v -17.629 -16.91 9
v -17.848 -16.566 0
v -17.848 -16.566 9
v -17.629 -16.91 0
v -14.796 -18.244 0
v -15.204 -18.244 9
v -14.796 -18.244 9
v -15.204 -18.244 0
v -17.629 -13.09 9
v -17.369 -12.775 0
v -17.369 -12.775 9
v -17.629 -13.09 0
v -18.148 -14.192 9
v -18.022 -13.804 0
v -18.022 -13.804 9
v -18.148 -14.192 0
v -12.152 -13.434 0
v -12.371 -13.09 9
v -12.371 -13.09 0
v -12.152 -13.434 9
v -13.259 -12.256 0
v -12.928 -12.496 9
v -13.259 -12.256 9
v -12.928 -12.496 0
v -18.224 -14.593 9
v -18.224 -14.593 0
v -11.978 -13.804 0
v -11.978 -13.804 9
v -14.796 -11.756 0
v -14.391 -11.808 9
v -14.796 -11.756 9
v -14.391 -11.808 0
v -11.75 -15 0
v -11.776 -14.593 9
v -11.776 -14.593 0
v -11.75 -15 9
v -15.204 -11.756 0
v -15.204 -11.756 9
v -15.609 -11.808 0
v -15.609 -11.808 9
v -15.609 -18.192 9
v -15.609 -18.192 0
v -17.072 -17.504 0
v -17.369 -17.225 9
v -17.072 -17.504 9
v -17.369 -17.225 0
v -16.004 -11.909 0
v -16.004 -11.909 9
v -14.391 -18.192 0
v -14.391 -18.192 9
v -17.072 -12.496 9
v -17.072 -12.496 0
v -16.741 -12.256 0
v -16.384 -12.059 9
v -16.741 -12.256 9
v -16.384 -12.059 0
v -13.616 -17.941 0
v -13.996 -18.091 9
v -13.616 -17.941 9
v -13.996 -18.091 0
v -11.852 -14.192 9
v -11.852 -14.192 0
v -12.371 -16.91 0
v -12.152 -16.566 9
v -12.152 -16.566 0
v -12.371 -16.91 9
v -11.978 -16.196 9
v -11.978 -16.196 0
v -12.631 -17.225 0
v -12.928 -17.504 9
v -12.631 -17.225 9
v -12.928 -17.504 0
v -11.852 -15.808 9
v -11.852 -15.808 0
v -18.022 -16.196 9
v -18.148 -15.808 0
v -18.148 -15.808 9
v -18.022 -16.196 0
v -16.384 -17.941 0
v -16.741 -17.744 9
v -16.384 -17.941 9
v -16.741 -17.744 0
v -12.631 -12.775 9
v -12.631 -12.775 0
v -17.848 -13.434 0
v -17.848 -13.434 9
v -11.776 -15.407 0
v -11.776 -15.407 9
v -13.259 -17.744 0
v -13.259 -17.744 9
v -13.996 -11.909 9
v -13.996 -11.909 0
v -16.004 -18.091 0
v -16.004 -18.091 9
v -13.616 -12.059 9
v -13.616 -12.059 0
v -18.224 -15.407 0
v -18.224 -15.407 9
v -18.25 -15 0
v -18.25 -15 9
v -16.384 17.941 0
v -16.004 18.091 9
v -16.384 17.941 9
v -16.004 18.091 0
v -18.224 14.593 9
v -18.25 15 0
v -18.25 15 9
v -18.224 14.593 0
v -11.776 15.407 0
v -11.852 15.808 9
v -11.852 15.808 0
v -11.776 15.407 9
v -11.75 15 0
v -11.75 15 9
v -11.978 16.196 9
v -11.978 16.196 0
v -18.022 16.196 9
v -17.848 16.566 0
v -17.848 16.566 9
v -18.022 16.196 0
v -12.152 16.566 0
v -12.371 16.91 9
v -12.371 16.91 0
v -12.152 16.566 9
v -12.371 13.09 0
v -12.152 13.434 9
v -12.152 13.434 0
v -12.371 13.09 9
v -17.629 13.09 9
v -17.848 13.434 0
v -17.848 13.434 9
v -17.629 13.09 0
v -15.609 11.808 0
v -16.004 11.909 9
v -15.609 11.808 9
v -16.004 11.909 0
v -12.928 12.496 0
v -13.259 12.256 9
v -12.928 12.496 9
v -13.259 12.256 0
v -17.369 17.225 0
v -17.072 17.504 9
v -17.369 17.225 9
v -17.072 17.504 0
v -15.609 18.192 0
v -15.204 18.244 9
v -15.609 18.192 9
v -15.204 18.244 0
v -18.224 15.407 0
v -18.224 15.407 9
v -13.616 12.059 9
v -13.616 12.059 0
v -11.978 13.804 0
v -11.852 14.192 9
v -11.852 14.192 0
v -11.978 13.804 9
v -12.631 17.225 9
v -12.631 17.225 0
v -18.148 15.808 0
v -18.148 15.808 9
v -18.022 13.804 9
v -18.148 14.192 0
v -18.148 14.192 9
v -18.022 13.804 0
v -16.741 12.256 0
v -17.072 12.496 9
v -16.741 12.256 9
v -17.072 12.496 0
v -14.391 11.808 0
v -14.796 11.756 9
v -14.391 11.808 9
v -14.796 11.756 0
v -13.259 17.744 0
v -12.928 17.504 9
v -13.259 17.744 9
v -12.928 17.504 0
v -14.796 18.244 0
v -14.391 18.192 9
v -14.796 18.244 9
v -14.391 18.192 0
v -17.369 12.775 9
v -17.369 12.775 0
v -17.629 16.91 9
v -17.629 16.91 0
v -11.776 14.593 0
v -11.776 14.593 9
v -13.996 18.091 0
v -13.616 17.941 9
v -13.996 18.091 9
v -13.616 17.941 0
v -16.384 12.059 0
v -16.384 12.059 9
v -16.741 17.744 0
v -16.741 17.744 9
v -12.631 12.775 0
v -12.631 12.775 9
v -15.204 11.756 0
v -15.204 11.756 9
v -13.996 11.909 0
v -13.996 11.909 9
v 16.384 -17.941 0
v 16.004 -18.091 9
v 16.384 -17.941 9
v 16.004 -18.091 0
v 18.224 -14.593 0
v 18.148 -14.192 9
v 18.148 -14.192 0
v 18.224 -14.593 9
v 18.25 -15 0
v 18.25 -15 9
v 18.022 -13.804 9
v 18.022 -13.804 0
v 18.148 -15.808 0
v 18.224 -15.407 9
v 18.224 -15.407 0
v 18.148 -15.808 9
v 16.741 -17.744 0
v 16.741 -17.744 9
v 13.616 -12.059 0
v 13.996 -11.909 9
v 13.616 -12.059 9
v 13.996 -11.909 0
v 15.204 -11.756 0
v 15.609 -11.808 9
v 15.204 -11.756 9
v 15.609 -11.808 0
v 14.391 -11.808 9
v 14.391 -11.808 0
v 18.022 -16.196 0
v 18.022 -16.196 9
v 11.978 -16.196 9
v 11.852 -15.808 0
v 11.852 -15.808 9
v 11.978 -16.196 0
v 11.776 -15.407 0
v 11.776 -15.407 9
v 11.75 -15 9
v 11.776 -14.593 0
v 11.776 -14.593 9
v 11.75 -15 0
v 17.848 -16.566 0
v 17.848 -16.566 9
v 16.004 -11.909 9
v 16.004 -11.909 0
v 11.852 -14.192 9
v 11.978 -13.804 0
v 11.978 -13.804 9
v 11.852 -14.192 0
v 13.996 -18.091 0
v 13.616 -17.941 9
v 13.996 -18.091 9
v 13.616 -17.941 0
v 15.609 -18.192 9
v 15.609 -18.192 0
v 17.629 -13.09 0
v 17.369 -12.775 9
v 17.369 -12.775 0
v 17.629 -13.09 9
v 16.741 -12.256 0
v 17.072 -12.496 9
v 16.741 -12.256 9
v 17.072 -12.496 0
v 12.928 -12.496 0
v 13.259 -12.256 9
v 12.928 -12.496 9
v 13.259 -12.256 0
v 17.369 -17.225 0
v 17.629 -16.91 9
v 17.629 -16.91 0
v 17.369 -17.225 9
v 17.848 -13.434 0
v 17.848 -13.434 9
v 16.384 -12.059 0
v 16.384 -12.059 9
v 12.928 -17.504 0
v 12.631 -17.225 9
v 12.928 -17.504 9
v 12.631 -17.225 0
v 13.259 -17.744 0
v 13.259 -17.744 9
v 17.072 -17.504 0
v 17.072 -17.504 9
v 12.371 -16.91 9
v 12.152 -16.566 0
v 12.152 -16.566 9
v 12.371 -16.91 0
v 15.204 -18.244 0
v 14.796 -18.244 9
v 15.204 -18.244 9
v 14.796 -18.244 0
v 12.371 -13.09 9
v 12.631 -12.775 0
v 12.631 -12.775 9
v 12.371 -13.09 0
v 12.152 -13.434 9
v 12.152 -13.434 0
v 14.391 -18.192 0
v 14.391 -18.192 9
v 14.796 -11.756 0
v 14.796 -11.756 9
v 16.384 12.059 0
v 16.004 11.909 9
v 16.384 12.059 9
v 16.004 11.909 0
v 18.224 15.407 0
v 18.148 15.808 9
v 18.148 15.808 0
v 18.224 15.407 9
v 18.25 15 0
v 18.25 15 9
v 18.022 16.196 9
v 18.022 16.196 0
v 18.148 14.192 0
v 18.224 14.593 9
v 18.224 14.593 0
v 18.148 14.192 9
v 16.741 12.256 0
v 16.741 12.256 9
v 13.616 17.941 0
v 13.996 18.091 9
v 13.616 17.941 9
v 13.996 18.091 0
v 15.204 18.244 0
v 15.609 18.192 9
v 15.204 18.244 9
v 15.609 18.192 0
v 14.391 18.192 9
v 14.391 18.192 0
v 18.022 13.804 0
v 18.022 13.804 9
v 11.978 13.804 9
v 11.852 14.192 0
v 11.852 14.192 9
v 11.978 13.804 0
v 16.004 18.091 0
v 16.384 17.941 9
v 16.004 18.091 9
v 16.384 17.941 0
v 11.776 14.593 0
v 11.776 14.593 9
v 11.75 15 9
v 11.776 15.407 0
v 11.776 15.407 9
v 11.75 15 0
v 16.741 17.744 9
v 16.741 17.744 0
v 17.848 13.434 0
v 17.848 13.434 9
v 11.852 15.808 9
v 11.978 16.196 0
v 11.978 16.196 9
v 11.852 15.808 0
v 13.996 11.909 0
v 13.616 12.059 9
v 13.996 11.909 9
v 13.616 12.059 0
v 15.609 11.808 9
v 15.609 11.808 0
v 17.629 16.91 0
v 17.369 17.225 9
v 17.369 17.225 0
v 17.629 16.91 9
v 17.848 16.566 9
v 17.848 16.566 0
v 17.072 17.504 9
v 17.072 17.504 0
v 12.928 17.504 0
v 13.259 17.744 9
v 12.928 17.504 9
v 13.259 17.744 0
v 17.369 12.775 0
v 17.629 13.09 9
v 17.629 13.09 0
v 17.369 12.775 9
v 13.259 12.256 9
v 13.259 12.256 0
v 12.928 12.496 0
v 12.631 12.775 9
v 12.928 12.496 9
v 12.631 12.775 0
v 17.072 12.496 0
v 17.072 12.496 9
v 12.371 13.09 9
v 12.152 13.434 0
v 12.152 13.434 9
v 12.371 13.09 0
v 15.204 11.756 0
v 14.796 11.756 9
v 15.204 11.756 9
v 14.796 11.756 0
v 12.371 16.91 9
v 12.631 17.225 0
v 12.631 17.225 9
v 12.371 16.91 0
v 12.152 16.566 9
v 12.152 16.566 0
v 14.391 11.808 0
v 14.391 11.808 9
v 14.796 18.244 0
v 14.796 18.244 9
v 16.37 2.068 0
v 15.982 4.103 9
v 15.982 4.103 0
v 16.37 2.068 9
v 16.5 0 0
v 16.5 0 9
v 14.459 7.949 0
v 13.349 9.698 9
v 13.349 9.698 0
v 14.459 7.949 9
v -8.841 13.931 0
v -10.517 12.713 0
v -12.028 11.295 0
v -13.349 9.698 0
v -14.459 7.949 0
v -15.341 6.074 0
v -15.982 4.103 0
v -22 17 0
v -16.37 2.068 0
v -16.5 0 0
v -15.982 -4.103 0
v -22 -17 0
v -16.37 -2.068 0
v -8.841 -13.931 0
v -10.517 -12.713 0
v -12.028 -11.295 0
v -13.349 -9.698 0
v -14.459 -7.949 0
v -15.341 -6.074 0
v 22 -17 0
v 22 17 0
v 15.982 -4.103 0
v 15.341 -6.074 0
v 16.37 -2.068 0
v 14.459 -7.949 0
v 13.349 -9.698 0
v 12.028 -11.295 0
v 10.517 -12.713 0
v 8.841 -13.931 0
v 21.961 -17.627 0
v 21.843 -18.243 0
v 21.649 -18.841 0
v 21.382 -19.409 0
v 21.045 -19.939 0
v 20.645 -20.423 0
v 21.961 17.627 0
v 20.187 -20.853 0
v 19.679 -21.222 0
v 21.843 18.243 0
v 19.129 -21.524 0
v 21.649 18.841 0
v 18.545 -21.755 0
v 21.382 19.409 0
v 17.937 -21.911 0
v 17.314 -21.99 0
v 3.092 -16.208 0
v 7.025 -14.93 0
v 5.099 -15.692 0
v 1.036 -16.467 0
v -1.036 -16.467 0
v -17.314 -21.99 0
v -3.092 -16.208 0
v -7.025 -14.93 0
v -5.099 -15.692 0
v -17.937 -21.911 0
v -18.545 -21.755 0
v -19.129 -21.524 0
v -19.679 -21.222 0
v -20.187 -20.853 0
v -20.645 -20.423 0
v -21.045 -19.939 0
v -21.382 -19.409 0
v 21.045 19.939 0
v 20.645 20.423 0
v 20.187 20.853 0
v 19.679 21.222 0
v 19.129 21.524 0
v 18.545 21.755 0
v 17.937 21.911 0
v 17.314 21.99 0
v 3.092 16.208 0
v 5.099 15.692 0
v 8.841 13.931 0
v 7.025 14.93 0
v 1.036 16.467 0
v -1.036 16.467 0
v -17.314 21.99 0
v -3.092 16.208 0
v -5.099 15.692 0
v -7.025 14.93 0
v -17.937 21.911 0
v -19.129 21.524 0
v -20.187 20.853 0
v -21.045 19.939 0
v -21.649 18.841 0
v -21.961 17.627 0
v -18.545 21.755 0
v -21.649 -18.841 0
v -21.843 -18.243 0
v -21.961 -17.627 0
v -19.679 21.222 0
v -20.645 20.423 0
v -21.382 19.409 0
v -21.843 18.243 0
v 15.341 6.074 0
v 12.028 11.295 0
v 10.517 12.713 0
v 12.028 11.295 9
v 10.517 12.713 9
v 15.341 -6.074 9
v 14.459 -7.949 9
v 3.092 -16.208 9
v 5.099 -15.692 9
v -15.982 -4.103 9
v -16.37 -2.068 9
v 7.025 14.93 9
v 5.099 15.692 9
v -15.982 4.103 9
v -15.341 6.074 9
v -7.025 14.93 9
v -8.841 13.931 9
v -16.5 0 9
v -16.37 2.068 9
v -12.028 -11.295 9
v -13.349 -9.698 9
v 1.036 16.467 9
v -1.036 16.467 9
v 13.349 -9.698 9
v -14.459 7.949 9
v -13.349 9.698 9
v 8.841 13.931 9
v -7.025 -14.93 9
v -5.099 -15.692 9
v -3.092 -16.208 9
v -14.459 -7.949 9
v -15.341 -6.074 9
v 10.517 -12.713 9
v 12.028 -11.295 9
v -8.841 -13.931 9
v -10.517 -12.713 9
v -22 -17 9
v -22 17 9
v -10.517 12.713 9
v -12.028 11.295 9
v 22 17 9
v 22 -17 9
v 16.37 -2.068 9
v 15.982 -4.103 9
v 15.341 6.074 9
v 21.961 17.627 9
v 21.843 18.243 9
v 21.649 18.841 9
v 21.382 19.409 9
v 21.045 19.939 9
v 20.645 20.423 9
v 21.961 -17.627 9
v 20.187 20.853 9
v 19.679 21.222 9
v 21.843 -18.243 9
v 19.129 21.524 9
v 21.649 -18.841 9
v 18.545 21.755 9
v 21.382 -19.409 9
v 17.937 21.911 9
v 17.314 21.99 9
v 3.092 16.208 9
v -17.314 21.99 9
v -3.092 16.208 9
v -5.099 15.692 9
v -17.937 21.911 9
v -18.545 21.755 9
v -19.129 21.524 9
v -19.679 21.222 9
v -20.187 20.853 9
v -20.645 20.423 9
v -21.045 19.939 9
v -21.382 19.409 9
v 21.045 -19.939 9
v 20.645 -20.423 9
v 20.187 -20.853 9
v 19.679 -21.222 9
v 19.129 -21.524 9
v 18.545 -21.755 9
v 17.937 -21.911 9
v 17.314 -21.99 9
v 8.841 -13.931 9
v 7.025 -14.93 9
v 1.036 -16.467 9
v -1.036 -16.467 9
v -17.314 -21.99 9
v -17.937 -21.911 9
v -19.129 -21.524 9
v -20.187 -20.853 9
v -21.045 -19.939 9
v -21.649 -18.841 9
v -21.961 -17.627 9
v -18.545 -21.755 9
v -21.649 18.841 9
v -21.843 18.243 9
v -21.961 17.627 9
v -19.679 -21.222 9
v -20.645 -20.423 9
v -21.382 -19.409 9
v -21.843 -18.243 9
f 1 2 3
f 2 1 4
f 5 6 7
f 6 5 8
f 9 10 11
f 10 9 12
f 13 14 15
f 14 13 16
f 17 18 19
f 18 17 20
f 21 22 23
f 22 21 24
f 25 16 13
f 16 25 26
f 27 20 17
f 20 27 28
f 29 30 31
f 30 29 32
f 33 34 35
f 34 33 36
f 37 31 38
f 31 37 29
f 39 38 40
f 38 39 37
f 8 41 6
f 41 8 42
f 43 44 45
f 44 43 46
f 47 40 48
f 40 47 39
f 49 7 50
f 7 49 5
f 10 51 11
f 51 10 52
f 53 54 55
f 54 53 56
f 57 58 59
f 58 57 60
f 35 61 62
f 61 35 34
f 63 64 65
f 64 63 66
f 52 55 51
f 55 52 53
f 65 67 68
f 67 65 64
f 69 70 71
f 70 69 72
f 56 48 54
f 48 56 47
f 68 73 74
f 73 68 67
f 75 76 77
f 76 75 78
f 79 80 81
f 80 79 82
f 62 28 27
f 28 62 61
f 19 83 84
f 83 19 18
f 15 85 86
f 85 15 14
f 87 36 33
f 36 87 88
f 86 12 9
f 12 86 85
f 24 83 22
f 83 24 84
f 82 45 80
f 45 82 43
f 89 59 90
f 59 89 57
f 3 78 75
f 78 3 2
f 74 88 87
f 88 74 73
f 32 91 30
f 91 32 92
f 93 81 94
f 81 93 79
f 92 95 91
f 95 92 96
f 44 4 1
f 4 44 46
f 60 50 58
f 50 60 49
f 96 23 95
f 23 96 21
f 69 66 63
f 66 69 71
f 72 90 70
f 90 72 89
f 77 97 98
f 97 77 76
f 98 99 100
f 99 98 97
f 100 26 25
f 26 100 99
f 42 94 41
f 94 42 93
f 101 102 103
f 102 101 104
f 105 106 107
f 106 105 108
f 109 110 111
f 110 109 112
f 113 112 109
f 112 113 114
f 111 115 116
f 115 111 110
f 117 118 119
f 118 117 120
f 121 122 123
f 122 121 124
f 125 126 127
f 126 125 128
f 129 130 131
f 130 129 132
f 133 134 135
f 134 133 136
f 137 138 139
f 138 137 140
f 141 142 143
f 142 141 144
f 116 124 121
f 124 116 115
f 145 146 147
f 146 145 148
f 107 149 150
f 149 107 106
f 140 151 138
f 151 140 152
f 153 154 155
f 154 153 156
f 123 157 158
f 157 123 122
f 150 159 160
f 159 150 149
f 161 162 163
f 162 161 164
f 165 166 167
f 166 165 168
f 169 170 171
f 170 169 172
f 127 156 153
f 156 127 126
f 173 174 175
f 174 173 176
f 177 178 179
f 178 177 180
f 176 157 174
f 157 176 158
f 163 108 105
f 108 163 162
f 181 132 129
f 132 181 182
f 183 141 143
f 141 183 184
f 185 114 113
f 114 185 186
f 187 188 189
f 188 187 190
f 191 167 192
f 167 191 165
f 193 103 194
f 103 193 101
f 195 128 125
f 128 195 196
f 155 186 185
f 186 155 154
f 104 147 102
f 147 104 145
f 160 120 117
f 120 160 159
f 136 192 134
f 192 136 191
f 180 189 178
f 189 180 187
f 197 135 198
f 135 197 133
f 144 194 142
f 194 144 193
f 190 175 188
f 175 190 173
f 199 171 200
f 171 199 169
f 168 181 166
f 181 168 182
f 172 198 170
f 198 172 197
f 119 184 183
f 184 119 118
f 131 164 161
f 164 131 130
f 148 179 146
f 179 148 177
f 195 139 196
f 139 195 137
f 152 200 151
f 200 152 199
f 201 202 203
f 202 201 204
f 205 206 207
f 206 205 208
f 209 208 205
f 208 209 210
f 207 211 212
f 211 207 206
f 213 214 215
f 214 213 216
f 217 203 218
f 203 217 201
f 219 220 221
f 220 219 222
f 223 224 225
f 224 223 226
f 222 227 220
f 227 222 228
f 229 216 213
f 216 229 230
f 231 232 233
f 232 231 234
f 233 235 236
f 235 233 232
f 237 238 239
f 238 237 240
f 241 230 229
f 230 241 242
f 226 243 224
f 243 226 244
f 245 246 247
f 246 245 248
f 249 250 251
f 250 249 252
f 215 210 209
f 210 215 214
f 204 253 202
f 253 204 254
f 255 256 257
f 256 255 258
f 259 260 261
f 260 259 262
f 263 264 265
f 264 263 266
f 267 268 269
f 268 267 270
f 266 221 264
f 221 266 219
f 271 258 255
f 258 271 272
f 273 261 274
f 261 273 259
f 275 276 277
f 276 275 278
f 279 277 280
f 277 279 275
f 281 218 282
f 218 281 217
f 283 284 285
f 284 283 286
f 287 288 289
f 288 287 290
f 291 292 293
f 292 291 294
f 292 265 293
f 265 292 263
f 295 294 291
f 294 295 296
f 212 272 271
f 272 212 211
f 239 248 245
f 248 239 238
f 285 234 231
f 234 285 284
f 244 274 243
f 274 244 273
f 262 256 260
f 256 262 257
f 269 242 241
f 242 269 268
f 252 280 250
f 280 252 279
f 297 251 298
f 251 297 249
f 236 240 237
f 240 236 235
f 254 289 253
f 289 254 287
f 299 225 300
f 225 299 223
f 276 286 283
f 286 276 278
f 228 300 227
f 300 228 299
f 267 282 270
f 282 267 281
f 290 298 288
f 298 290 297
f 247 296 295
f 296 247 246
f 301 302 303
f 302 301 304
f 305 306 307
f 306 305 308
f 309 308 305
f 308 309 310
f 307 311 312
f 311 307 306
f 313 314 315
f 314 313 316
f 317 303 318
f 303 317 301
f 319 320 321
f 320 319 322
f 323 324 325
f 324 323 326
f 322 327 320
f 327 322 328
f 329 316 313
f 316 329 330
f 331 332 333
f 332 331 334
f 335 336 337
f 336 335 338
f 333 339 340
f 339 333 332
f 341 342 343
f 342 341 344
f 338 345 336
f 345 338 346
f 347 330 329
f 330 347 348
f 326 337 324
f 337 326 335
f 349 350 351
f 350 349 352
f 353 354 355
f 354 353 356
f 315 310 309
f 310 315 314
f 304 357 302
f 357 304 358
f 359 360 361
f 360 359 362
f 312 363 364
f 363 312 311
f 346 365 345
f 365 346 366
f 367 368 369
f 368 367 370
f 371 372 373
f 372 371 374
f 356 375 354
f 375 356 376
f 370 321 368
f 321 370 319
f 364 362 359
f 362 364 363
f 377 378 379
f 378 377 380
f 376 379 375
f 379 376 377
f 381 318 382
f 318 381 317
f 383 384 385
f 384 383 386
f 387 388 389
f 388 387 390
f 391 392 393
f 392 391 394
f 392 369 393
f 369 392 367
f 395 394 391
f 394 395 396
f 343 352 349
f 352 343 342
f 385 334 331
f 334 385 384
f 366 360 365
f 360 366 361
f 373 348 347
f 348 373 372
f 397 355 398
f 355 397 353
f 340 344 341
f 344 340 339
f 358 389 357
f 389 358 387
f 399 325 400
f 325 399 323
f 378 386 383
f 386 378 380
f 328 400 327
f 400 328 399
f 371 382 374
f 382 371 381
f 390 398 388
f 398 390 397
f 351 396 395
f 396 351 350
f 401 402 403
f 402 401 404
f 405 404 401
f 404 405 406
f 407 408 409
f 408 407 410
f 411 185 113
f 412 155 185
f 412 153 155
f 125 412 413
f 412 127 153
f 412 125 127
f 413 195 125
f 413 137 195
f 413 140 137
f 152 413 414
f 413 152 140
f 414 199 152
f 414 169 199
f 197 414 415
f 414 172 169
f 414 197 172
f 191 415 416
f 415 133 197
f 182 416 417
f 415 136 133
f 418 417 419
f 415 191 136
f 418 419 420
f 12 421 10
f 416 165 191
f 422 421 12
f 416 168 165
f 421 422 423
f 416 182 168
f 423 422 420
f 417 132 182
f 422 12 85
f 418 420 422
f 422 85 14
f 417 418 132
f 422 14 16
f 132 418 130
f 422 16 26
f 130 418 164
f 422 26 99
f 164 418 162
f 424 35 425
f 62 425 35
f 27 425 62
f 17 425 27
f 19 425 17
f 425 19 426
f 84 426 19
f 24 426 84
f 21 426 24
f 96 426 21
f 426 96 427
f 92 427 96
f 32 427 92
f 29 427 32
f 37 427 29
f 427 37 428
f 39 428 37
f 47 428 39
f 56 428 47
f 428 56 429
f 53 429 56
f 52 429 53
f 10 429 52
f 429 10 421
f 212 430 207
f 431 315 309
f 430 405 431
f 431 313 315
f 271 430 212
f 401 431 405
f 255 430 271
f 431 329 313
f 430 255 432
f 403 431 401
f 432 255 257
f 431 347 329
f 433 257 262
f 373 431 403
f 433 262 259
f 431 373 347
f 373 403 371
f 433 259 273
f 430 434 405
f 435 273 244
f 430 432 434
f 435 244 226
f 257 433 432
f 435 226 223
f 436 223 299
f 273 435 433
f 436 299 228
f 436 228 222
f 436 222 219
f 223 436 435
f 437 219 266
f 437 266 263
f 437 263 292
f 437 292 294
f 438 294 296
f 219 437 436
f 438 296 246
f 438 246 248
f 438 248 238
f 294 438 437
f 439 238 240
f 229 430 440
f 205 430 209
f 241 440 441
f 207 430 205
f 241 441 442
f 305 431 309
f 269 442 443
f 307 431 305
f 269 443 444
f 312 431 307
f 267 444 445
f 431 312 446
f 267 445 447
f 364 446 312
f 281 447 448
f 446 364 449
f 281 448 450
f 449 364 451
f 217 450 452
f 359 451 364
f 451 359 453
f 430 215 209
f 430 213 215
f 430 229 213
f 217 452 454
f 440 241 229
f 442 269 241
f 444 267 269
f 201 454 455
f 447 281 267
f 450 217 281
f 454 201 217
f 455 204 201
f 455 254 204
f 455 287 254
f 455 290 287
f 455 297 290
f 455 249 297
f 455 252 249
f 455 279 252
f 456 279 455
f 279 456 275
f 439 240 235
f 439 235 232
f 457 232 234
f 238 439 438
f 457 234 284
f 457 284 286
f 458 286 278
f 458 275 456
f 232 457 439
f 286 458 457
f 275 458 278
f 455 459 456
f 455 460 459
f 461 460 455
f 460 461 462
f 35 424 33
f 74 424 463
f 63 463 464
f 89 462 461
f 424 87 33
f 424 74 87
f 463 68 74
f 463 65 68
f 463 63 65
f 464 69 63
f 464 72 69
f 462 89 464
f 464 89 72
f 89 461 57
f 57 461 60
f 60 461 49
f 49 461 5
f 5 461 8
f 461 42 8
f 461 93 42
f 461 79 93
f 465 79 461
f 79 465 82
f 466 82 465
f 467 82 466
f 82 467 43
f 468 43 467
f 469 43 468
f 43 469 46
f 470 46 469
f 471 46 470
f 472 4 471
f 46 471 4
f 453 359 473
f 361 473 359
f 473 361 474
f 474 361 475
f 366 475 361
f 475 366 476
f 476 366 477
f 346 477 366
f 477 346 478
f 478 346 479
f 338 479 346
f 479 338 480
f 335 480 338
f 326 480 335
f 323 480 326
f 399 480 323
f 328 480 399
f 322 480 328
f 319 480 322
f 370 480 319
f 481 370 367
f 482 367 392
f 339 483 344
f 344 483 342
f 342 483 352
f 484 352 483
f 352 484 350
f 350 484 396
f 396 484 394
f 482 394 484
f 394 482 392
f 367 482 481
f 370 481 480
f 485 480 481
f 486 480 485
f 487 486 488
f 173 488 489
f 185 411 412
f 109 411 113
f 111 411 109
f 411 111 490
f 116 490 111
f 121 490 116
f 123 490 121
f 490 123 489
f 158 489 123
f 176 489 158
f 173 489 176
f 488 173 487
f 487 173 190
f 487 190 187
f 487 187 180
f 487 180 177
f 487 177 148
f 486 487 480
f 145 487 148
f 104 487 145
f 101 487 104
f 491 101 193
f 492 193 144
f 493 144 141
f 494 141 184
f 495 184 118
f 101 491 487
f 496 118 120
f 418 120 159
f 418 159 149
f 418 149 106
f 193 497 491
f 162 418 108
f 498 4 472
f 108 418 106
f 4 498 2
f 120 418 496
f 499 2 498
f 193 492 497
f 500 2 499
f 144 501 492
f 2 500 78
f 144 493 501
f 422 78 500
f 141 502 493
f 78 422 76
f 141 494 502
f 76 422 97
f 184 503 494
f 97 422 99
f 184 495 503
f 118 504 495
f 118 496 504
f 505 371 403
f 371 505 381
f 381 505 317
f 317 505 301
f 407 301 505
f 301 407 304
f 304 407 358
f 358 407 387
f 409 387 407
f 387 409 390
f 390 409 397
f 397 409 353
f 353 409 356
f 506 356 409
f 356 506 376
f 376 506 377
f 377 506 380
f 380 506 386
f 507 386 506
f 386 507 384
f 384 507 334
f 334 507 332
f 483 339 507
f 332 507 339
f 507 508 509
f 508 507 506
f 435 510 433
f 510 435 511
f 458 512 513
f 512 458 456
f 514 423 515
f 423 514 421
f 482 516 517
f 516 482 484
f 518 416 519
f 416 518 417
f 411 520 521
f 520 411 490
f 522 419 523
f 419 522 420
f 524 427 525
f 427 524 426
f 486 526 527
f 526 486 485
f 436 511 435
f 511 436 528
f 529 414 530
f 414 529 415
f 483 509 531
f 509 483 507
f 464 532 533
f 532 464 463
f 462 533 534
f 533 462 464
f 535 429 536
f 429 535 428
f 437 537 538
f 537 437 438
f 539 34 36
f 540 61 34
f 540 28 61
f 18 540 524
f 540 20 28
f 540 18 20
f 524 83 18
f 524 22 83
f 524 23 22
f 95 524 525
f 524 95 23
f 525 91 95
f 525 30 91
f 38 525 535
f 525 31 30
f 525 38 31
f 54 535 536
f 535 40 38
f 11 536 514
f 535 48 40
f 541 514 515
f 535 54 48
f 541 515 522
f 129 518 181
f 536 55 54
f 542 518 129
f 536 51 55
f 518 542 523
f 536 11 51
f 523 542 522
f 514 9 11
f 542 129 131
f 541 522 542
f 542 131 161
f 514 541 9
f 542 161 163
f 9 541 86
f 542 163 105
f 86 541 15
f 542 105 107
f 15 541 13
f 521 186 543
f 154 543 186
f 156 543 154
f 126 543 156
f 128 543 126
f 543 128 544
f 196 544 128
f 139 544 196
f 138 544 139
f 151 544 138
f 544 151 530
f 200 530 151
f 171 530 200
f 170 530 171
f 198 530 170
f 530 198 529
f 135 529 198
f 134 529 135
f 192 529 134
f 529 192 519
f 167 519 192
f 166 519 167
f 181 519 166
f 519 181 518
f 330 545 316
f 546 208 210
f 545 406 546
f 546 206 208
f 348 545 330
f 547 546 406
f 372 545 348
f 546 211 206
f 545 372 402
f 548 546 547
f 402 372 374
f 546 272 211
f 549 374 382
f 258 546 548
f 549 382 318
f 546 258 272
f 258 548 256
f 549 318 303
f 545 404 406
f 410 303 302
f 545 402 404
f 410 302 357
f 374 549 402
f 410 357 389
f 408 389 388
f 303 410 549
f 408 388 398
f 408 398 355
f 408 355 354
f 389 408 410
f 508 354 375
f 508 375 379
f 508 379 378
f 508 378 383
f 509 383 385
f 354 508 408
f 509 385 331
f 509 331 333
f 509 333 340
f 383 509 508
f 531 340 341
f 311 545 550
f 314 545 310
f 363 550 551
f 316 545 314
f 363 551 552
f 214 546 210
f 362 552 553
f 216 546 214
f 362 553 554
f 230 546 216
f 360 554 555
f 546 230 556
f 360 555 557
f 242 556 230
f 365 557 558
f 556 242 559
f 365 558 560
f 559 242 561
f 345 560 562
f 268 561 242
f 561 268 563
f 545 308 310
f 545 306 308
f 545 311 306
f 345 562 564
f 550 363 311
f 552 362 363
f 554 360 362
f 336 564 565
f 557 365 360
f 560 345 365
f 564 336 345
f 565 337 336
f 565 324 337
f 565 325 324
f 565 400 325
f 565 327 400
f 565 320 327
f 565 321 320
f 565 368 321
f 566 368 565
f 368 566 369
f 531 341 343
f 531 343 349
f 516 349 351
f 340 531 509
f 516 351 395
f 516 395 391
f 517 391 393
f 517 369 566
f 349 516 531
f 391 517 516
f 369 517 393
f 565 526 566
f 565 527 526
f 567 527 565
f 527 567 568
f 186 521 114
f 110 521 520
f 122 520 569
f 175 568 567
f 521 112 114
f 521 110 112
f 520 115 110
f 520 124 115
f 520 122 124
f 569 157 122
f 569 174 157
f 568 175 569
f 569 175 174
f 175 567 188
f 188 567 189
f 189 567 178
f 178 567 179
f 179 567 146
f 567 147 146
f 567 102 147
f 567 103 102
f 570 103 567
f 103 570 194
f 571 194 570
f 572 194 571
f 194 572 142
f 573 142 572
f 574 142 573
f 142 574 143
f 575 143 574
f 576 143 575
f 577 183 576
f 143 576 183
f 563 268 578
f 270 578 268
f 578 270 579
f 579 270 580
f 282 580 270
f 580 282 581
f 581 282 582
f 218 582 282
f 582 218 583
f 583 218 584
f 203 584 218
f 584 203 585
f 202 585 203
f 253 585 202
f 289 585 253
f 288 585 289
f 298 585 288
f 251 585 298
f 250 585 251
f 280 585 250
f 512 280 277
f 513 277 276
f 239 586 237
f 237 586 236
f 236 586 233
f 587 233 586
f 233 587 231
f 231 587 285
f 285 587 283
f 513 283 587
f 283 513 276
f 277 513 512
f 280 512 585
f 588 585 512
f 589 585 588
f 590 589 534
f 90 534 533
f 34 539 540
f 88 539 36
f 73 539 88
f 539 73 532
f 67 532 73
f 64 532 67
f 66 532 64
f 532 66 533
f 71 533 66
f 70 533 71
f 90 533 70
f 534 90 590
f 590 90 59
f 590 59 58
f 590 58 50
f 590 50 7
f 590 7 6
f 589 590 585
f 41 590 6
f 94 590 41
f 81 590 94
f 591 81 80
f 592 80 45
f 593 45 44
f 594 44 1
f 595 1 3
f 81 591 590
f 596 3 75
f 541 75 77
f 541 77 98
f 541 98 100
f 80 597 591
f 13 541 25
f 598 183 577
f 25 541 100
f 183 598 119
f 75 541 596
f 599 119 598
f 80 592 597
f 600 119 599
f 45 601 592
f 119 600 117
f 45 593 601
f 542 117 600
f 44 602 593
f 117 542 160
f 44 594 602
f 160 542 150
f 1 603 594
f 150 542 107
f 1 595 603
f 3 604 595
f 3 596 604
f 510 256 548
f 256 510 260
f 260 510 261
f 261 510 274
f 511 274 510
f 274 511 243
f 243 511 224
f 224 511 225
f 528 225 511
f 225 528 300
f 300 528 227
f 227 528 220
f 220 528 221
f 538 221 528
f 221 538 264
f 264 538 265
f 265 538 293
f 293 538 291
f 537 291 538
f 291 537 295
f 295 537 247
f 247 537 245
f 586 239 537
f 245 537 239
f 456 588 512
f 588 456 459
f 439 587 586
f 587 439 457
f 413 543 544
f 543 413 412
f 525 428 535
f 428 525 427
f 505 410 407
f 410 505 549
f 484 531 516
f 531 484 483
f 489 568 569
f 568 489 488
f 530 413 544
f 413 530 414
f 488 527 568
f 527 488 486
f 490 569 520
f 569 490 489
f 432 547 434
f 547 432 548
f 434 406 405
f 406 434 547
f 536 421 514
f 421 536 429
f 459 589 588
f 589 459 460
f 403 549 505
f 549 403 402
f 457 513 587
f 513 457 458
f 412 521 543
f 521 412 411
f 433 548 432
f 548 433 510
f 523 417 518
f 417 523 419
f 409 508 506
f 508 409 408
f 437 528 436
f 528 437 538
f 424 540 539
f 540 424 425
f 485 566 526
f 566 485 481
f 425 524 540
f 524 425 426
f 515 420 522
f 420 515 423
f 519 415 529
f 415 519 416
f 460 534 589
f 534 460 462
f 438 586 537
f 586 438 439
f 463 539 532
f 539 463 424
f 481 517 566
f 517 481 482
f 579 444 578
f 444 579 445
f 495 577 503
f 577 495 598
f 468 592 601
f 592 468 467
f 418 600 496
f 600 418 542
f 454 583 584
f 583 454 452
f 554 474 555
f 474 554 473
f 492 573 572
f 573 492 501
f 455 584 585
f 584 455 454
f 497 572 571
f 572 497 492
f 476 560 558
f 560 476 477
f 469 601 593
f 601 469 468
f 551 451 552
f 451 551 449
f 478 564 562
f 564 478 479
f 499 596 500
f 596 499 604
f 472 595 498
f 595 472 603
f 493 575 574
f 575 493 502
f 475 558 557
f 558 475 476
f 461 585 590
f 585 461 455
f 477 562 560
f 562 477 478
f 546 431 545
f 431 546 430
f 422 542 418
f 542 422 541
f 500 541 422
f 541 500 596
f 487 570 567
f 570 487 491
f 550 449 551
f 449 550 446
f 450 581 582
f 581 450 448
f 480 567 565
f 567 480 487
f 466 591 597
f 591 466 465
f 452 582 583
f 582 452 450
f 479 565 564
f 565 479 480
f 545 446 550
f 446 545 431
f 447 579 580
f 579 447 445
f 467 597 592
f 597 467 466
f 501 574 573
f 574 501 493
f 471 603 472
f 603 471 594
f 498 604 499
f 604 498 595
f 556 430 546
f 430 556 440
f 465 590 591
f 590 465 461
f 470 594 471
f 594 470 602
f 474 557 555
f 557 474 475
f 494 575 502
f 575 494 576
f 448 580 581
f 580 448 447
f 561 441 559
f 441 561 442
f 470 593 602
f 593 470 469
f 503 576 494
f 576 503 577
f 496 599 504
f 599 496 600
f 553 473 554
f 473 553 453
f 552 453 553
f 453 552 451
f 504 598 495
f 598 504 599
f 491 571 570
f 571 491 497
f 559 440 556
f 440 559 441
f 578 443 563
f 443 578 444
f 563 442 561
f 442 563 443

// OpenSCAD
$fn = 50;


difference() {
	union() {
		hull() {
			translate(v = [-17.0000000000, 17.0000000000, 0]) {
				cylinder(h = 9, r = 5);
			}
			translate(v = [17.0000000000, 17.0000000000, 0]) {
				cylinder(h = 9, r = 5);
			}
			translate(v = [-17.0000000000, -17.0000000000, 0]) {
				cylinder(h = 9, r = 5);
			}
			translate(v = [17.0000000000, -17.0000000000, 0]) {
				cylinder(h = 9, r = 5);
			}
		}
	}
	union() {
		#translate(v = [-15.0000000000, -15.0000000000, -100.0000000000]) {
			cylinder(h = 200, r = 3.2500000000);
		}
		#translate(v = [-15.0000000000, 15.0000000000, -100.0000000000]) {
			cylinder(h = 200, r = 3.2500000000);
		}
		#translate(v = [15.0000000000, -15.0000000000, -100.0000000000]) {
			cylinder(h = 200, r = 3.2500000000);
		}
		#translate(v = [15.0000000000, 15.0000000000, -100.0000000000]) {
			cylinder(h = 200, r = 3.2500000000);
		}
		#cylinder(h = 9, r = 16.5000000000);
	}
}
